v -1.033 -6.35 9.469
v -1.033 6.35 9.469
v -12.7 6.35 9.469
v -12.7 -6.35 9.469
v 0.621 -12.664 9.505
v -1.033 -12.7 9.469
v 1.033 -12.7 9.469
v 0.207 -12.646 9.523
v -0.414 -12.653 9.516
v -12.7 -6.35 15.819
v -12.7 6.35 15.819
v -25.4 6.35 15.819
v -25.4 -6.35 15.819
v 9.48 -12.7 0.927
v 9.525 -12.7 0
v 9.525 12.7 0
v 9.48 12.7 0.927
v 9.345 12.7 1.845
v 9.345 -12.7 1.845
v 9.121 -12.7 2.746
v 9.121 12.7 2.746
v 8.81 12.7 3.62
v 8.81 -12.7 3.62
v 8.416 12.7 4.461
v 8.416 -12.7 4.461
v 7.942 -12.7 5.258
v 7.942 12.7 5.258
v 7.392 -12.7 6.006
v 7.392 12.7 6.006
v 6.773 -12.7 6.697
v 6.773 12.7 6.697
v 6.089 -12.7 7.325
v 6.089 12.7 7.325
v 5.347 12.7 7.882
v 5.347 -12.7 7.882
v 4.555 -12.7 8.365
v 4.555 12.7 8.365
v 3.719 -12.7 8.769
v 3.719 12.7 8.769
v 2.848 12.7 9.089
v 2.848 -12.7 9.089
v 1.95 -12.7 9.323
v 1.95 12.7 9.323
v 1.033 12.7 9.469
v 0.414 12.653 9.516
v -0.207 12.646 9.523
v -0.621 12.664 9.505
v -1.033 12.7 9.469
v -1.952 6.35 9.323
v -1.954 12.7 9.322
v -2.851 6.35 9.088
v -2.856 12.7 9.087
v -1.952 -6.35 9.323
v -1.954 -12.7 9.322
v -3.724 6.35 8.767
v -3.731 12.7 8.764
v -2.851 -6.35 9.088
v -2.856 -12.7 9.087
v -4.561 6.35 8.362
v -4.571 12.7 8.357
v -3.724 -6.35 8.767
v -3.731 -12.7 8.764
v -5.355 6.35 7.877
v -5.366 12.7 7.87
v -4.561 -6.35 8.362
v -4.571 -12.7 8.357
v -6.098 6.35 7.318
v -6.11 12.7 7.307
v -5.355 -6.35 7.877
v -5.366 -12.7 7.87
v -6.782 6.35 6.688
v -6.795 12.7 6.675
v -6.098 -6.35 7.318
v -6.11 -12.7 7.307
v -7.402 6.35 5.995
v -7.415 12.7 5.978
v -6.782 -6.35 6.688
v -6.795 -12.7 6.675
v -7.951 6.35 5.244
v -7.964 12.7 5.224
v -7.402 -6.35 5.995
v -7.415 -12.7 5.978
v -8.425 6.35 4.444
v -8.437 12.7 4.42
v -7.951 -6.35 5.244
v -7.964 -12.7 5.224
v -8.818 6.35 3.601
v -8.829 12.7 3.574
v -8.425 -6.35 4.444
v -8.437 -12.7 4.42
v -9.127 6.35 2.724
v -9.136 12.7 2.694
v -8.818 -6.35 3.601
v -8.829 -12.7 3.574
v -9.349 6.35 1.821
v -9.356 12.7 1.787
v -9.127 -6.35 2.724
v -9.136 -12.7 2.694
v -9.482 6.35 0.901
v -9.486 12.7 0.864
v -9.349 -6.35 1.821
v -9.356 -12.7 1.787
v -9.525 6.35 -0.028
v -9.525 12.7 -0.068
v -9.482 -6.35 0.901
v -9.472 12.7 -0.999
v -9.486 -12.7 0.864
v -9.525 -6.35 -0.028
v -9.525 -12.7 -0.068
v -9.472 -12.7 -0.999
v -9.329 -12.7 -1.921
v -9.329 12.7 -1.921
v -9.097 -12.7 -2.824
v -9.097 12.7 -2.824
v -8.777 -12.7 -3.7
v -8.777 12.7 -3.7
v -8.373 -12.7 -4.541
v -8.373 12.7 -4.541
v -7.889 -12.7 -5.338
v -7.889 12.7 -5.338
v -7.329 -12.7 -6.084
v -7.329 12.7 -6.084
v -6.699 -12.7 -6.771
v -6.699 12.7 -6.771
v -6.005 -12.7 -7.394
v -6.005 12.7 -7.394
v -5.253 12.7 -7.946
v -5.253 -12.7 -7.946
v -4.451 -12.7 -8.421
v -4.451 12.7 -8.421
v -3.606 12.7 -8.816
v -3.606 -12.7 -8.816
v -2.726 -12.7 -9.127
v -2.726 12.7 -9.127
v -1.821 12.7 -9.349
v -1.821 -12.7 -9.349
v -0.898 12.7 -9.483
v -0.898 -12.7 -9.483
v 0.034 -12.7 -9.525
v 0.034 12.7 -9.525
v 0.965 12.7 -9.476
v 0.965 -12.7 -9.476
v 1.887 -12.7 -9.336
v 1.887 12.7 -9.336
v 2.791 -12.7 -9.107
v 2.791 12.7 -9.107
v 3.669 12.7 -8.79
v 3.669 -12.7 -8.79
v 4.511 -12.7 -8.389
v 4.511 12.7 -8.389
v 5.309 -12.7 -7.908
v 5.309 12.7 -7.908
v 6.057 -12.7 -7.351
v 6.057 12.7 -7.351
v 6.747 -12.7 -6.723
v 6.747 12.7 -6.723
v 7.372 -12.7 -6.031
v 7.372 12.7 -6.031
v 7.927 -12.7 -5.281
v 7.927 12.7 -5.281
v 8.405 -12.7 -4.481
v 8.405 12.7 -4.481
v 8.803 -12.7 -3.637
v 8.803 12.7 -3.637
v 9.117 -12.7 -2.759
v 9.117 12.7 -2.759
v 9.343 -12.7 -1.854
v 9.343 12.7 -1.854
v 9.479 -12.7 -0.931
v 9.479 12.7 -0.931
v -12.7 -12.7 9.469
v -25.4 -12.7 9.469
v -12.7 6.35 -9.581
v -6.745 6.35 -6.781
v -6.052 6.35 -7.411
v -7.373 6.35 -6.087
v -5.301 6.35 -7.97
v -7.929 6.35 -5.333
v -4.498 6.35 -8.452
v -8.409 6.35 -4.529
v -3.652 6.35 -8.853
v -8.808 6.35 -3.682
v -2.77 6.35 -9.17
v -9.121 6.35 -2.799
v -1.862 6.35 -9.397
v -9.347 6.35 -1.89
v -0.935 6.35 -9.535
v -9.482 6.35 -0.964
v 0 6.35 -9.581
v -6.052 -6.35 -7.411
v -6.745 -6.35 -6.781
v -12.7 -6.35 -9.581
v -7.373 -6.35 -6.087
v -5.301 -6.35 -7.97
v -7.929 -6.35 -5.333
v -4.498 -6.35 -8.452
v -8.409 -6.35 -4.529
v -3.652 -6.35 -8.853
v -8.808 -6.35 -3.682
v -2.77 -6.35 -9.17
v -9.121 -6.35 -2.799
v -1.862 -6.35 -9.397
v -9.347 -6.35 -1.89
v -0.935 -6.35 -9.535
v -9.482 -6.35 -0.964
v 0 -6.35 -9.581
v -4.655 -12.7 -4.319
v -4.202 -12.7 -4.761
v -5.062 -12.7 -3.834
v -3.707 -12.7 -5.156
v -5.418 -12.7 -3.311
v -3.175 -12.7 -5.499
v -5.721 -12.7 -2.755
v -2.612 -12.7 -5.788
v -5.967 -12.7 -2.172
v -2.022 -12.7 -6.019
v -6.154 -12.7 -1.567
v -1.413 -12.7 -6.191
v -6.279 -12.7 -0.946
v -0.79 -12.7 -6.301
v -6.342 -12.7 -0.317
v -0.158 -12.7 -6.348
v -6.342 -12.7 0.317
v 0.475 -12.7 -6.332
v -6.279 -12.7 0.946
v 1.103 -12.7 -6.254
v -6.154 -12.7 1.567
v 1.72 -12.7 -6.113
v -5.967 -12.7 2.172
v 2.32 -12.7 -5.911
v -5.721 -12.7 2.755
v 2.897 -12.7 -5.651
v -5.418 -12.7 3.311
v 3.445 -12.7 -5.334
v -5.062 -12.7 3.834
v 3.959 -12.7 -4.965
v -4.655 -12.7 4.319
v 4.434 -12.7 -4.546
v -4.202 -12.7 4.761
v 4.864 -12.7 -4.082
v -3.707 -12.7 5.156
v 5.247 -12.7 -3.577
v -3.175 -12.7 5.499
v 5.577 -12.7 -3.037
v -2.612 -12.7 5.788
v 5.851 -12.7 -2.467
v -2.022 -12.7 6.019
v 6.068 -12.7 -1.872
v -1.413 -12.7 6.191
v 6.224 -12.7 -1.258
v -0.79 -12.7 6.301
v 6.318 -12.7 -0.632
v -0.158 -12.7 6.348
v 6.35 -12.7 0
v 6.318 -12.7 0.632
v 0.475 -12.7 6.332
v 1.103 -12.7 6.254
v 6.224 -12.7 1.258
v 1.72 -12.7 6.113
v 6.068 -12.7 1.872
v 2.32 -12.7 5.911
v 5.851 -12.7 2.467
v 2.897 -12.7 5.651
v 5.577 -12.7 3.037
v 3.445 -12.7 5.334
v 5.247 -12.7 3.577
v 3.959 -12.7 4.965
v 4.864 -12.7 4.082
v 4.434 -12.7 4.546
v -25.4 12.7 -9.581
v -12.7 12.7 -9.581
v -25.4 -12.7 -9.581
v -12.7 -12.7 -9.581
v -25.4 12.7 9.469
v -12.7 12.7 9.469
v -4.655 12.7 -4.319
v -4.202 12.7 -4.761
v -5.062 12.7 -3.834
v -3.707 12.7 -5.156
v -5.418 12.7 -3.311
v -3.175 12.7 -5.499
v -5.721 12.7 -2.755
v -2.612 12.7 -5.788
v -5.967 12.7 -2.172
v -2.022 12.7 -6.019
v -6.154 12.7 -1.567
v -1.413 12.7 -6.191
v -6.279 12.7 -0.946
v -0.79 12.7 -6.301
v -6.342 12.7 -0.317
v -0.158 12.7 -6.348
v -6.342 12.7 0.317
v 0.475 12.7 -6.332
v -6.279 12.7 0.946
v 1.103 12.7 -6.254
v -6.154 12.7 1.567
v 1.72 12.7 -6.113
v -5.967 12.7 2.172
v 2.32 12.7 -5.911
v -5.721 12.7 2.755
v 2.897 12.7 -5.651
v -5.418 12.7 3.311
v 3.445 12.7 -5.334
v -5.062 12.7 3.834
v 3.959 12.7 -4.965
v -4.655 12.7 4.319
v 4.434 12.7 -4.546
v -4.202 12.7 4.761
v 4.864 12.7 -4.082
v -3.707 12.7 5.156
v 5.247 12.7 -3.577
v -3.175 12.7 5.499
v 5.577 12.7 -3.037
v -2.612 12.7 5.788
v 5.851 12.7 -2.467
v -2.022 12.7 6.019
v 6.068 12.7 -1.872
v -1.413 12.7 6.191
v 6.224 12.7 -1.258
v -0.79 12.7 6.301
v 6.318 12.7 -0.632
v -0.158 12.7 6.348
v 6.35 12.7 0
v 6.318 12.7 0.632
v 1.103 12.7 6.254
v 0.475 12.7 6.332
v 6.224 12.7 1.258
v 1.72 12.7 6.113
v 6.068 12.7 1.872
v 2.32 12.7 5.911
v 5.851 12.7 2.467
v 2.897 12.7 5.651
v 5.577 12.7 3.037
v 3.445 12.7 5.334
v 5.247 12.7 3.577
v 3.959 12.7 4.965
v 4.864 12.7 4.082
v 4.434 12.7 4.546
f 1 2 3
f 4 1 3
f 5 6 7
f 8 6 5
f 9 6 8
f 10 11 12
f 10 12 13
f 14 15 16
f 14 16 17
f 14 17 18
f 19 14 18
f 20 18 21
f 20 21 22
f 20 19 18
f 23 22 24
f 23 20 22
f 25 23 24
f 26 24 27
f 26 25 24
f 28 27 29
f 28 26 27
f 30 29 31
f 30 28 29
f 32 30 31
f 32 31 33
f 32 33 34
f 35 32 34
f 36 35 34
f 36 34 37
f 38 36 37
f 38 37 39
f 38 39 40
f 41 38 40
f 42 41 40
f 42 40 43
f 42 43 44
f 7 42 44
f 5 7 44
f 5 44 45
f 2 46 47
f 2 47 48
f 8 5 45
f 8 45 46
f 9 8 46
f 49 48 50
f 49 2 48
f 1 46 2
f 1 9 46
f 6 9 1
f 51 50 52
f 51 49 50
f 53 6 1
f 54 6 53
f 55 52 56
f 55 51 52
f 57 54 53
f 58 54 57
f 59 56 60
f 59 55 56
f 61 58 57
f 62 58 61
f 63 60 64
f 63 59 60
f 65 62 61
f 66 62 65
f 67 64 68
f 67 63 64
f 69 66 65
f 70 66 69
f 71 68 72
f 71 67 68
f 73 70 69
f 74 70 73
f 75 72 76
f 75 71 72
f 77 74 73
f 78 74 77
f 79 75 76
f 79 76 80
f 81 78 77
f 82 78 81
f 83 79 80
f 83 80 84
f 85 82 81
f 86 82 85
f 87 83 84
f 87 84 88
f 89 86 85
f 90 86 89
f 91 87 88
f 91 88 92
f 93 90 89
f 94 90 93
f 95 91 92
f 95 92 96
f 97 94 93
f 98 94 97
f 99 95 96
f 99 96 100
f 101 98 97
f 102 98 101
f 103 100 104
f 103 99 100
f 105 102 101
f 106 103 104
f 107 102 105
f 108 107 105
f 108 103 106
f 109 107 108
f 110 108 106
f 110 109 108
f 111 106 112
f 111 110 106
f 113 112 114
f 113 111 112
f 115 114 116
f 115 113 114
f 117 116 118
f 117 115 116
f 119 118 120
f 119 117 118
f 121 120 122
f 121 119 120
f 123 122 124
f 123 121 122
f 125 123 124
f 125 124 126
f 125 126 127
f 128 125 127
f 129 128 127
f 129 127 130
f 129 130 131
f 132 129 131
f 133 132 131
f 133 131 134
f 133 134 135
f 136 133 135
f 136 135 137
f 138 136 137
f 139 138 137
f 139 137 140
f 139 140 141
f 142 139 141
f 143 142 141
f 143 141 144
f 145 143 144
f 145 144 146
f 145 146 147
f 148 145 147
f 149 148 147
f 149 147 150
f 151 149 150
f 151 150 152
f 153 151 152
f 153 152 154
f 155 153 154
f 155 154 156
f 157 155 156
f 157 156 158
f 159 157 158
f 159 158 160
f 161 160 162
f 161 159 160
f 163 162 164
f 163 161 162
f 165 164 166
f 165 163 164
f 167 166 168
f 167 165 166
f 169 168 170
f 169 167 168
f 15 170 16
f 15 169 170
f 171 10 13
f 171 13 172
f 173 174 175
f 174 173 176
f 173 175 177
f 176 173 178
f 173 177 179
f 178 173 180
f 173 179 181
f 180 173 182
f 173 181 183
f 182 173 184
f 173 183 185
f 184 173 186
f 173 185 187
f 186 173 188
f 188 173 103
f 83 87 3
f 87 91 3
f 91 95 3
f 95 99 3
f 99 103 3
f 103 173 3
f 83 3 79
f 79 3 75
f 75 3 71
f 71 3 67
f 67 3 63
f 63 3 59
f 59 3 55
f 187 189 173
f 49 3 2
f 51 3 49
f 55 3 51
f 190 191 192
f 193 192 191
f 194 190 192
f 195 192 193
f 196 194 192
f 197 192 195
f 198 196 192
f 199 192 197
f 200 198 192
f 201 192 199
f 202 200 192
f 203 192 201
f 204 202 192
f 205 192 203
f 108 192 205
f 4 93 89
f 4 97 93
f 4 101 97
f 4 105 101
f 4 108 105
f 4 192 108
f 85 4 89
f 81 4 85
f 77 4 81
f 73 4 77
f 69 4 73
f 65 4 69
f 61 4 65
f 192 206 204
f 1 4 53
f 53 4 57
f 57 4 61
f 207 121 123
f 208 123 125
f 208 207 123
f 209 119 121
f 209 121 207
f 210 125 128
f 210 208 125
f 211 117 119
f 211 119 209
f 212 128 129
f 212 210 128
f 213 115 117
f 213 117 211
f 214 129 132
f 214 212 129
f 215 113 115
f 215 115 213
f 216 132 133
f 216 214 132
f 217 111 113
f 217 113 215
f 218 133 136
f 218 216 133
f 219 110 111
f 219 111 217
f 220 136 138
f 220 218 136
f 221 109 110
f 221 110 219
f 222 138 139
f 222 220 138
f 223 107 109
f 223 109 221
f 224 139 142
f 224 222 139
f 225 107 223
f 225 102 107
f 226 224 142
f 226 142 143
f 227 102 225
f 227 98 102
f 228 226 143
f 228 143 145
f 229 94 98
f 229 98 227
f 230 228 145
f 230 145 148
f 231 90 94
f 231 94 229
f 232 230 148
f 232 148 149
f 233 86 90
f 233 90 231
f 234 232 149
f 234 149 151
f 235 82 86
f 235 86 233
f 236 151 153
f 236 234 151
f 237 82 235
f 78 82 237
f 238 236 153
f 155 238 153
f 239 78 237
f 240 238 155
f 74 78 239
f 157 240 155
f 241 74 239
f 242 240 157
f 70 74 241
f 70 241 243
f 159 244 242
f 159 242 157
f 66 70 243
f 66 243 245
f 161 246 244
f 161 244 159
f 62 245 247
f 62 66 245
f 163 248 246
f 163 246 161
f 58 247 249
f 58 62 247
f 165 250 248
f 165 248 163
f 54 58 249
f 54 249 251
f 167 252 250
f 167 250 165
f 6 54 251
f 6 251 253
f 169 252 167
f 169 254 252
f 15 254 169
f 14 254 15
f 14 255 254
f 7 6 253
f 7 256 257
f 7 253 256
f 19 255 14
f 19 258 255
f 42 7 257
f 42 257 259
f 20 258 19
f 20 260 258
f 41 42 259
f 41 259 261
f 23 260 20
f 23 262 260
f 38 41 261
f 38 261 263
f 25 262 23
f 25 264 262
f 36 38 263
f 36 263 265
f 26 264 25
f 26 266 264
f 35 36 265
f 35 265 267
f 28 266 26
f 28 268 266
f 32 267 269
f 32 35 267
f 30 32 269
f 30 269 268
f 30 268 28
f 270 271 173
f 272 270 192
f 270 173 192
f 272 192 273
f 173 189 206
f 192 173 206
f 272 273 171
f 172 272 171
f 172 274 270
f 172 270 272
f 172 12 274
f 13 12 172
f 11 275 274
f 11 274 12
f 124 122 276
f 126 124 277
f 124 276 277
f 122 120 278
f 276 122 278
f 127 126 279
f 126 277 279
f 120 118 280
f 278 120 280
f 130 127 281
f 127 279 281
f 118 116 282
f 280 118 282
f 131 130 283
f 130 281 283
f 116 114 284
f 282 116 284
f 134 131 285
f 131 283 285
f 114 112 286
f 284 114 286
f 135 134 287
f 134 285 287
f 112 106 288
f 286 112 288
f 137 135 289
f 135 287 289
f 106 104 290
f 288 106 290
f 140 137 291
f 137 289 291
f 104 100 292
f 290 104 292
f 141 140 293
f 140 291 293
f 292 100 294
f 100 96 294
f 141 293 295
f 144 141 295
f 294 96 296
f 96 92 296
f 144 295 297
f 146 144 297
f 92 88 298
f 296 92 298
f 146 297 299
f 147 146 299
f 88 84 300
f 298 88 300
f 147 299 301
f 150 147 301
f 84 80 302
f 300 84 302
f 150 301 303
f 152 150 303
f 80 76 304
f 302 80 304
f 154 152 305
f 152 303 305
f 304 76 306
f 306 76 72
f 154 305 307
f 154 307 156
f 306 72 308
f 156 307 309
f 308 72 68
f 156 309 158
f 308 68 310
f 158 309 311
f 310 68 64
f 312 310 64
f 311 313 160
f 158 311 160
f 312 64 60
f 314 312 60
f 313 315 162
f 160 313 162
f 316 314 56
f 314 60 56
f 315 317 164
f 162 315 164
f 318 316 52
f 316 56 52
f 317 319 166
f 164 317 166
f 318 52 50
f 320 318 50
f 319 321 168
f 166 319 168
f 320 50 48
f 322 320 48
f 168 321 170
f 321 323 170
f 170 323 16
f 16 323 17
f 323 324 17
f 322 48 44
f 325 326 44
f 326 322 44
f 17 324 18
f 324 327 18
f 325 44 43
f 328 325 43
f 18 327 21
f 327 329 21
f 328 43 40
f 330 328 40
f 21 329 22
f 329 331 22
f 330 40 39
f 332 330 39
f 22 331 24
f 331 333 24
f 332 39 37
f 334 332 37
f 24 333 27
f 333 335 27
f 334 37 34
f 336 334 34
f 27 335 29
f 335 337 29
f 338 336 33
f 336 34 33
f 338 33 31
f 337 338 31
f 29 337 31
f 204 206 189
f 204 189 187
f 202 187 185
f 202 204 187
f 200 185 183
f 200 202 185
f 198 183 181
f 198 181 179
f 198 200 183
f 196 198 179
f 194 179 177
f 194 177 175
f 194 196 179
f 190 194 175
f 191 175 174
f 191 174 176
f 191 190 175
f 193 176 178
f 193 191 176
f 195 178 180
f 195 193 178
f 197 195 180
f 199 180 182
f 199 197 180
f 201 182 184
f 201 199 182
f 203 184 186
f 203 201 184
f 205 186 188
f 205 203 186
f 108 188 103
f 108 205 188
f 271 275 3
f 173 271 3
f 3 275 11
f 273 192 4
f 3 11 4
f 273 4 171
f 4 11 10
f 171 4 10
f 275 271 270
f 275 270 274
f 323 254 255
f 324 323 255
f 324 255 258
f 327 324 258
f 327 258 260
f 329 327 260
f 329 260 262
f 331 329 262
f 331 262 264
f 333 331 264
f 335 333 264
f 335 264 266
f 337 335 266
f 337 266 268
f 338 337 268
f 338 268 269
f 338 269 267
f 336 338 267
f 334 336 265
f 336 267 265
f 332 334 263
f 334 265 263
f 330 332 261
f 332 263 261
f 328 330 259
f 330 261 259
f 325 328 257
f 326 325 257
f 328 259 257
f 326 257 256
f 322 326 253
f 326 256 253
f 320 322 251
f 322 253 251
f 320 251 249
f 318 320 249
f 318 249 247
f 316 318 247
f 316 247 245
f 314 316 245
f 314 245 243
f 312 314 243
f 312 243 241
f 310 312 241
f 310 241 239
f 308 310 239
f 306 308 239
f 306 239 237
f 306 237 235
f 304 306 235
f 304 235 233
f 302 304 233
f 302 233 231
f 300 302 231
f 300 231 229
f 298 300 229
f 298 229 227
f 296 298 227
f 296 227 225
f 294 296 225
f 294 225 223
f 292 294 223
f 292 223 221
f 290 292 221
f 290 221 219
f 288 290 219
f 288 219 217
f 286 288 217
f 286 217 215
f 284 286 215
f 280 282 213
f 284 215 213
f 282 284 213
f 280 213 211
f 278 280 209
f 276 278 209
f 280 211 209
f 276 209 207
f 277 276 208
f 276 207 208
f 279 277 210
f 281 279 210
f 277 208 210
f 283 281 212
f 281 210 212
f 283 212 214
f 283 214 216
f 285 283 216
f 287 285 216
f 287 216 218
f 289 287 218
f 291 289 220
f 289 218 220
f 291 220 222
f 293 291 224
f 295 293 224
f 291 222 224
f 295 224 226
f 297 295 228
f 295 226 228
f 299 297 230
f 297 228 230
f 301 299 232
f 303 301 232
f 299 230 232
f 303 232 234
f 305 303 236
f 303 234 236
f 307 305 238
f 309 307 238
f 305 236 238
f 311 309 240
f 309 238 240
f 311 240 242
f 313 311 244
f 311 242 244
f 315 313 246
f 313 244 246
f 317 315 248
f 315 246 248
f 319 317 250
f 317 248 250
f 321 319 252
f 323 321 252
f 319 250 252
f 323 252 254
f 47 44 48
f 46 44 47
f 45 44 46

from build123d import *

# Parameters (mm, degrees)
F0_R     = 9.525
F1_DEPTH = 12.7
F3_DEPTH = 6.35
F4_W     = 25.4
F4_H     = 25.4
F5_DEPTH = 12.7
F7_DEPTH = 34.926
F8_R     = 6.35
F9_DEPTH = 25.401


with BuildPart() as f1:
    # F0 (on Front) → F1 (new body, symmetric)
    with BuildSketch(Plane.XZ):
        Circle(F0_R)
    extrude(amount=F1_DEPTH, both=True)

    # F2 (on Front) → F3 (join, symmetric)
    with BuildSketch(Plane.XZ):
        with BuildLine():
            ThreePointArc((0, -9.581195), (-9.525, -0.056195), (0, 9.468805))
            Line((0, 9.468805), (-12.7, 9.468805))
            Line((-12.7, 9.468805), (-12.7, -9.581195))
            Line((-12.7, -9.581195), (0, -9.581195))
        make_face()
    extrude(amount=F3_DEPTH, both=True)

    # F4 (on face) → F5 (join)
    with BuildSketch(Plane(origin=(-12.7, 0, 0), x_dir=(0, -1, 0), z_dir=(-1, 0, 0))):
        with Locations((0, 3.118805)):
            Rectangle(F4_W, F4_H)
    extrude(amount=F5_DEPTH)

    # F6 (on face) → F7 (cut, through all)
    with BuildSketch(Plane(origin=(-25.4, 0, 0), x_dir=(0, -1, 0), z_dir=(-1, 0, 0))):
        Polygon((-6.35, 15.818805), (-12.7, 15.818805), (-12.7, 9.468805), align=None)
        Polygon((12.7, 9.468805), (12.7, 15.818805), (6.35, 15.818805), align=None)
    extrude(amount=-F7_DEPTH, mode=Mode.SUBTRACT)

    # F8 (on face) → F9 (cut, through all)
    with BuildSketch(Plane.XZ.offset(12.7)):
        Circle(F8_R)
    extrude(amount=-F9_DEPTH, mode=Mode.SUBTRACT)


solid = f1.part
